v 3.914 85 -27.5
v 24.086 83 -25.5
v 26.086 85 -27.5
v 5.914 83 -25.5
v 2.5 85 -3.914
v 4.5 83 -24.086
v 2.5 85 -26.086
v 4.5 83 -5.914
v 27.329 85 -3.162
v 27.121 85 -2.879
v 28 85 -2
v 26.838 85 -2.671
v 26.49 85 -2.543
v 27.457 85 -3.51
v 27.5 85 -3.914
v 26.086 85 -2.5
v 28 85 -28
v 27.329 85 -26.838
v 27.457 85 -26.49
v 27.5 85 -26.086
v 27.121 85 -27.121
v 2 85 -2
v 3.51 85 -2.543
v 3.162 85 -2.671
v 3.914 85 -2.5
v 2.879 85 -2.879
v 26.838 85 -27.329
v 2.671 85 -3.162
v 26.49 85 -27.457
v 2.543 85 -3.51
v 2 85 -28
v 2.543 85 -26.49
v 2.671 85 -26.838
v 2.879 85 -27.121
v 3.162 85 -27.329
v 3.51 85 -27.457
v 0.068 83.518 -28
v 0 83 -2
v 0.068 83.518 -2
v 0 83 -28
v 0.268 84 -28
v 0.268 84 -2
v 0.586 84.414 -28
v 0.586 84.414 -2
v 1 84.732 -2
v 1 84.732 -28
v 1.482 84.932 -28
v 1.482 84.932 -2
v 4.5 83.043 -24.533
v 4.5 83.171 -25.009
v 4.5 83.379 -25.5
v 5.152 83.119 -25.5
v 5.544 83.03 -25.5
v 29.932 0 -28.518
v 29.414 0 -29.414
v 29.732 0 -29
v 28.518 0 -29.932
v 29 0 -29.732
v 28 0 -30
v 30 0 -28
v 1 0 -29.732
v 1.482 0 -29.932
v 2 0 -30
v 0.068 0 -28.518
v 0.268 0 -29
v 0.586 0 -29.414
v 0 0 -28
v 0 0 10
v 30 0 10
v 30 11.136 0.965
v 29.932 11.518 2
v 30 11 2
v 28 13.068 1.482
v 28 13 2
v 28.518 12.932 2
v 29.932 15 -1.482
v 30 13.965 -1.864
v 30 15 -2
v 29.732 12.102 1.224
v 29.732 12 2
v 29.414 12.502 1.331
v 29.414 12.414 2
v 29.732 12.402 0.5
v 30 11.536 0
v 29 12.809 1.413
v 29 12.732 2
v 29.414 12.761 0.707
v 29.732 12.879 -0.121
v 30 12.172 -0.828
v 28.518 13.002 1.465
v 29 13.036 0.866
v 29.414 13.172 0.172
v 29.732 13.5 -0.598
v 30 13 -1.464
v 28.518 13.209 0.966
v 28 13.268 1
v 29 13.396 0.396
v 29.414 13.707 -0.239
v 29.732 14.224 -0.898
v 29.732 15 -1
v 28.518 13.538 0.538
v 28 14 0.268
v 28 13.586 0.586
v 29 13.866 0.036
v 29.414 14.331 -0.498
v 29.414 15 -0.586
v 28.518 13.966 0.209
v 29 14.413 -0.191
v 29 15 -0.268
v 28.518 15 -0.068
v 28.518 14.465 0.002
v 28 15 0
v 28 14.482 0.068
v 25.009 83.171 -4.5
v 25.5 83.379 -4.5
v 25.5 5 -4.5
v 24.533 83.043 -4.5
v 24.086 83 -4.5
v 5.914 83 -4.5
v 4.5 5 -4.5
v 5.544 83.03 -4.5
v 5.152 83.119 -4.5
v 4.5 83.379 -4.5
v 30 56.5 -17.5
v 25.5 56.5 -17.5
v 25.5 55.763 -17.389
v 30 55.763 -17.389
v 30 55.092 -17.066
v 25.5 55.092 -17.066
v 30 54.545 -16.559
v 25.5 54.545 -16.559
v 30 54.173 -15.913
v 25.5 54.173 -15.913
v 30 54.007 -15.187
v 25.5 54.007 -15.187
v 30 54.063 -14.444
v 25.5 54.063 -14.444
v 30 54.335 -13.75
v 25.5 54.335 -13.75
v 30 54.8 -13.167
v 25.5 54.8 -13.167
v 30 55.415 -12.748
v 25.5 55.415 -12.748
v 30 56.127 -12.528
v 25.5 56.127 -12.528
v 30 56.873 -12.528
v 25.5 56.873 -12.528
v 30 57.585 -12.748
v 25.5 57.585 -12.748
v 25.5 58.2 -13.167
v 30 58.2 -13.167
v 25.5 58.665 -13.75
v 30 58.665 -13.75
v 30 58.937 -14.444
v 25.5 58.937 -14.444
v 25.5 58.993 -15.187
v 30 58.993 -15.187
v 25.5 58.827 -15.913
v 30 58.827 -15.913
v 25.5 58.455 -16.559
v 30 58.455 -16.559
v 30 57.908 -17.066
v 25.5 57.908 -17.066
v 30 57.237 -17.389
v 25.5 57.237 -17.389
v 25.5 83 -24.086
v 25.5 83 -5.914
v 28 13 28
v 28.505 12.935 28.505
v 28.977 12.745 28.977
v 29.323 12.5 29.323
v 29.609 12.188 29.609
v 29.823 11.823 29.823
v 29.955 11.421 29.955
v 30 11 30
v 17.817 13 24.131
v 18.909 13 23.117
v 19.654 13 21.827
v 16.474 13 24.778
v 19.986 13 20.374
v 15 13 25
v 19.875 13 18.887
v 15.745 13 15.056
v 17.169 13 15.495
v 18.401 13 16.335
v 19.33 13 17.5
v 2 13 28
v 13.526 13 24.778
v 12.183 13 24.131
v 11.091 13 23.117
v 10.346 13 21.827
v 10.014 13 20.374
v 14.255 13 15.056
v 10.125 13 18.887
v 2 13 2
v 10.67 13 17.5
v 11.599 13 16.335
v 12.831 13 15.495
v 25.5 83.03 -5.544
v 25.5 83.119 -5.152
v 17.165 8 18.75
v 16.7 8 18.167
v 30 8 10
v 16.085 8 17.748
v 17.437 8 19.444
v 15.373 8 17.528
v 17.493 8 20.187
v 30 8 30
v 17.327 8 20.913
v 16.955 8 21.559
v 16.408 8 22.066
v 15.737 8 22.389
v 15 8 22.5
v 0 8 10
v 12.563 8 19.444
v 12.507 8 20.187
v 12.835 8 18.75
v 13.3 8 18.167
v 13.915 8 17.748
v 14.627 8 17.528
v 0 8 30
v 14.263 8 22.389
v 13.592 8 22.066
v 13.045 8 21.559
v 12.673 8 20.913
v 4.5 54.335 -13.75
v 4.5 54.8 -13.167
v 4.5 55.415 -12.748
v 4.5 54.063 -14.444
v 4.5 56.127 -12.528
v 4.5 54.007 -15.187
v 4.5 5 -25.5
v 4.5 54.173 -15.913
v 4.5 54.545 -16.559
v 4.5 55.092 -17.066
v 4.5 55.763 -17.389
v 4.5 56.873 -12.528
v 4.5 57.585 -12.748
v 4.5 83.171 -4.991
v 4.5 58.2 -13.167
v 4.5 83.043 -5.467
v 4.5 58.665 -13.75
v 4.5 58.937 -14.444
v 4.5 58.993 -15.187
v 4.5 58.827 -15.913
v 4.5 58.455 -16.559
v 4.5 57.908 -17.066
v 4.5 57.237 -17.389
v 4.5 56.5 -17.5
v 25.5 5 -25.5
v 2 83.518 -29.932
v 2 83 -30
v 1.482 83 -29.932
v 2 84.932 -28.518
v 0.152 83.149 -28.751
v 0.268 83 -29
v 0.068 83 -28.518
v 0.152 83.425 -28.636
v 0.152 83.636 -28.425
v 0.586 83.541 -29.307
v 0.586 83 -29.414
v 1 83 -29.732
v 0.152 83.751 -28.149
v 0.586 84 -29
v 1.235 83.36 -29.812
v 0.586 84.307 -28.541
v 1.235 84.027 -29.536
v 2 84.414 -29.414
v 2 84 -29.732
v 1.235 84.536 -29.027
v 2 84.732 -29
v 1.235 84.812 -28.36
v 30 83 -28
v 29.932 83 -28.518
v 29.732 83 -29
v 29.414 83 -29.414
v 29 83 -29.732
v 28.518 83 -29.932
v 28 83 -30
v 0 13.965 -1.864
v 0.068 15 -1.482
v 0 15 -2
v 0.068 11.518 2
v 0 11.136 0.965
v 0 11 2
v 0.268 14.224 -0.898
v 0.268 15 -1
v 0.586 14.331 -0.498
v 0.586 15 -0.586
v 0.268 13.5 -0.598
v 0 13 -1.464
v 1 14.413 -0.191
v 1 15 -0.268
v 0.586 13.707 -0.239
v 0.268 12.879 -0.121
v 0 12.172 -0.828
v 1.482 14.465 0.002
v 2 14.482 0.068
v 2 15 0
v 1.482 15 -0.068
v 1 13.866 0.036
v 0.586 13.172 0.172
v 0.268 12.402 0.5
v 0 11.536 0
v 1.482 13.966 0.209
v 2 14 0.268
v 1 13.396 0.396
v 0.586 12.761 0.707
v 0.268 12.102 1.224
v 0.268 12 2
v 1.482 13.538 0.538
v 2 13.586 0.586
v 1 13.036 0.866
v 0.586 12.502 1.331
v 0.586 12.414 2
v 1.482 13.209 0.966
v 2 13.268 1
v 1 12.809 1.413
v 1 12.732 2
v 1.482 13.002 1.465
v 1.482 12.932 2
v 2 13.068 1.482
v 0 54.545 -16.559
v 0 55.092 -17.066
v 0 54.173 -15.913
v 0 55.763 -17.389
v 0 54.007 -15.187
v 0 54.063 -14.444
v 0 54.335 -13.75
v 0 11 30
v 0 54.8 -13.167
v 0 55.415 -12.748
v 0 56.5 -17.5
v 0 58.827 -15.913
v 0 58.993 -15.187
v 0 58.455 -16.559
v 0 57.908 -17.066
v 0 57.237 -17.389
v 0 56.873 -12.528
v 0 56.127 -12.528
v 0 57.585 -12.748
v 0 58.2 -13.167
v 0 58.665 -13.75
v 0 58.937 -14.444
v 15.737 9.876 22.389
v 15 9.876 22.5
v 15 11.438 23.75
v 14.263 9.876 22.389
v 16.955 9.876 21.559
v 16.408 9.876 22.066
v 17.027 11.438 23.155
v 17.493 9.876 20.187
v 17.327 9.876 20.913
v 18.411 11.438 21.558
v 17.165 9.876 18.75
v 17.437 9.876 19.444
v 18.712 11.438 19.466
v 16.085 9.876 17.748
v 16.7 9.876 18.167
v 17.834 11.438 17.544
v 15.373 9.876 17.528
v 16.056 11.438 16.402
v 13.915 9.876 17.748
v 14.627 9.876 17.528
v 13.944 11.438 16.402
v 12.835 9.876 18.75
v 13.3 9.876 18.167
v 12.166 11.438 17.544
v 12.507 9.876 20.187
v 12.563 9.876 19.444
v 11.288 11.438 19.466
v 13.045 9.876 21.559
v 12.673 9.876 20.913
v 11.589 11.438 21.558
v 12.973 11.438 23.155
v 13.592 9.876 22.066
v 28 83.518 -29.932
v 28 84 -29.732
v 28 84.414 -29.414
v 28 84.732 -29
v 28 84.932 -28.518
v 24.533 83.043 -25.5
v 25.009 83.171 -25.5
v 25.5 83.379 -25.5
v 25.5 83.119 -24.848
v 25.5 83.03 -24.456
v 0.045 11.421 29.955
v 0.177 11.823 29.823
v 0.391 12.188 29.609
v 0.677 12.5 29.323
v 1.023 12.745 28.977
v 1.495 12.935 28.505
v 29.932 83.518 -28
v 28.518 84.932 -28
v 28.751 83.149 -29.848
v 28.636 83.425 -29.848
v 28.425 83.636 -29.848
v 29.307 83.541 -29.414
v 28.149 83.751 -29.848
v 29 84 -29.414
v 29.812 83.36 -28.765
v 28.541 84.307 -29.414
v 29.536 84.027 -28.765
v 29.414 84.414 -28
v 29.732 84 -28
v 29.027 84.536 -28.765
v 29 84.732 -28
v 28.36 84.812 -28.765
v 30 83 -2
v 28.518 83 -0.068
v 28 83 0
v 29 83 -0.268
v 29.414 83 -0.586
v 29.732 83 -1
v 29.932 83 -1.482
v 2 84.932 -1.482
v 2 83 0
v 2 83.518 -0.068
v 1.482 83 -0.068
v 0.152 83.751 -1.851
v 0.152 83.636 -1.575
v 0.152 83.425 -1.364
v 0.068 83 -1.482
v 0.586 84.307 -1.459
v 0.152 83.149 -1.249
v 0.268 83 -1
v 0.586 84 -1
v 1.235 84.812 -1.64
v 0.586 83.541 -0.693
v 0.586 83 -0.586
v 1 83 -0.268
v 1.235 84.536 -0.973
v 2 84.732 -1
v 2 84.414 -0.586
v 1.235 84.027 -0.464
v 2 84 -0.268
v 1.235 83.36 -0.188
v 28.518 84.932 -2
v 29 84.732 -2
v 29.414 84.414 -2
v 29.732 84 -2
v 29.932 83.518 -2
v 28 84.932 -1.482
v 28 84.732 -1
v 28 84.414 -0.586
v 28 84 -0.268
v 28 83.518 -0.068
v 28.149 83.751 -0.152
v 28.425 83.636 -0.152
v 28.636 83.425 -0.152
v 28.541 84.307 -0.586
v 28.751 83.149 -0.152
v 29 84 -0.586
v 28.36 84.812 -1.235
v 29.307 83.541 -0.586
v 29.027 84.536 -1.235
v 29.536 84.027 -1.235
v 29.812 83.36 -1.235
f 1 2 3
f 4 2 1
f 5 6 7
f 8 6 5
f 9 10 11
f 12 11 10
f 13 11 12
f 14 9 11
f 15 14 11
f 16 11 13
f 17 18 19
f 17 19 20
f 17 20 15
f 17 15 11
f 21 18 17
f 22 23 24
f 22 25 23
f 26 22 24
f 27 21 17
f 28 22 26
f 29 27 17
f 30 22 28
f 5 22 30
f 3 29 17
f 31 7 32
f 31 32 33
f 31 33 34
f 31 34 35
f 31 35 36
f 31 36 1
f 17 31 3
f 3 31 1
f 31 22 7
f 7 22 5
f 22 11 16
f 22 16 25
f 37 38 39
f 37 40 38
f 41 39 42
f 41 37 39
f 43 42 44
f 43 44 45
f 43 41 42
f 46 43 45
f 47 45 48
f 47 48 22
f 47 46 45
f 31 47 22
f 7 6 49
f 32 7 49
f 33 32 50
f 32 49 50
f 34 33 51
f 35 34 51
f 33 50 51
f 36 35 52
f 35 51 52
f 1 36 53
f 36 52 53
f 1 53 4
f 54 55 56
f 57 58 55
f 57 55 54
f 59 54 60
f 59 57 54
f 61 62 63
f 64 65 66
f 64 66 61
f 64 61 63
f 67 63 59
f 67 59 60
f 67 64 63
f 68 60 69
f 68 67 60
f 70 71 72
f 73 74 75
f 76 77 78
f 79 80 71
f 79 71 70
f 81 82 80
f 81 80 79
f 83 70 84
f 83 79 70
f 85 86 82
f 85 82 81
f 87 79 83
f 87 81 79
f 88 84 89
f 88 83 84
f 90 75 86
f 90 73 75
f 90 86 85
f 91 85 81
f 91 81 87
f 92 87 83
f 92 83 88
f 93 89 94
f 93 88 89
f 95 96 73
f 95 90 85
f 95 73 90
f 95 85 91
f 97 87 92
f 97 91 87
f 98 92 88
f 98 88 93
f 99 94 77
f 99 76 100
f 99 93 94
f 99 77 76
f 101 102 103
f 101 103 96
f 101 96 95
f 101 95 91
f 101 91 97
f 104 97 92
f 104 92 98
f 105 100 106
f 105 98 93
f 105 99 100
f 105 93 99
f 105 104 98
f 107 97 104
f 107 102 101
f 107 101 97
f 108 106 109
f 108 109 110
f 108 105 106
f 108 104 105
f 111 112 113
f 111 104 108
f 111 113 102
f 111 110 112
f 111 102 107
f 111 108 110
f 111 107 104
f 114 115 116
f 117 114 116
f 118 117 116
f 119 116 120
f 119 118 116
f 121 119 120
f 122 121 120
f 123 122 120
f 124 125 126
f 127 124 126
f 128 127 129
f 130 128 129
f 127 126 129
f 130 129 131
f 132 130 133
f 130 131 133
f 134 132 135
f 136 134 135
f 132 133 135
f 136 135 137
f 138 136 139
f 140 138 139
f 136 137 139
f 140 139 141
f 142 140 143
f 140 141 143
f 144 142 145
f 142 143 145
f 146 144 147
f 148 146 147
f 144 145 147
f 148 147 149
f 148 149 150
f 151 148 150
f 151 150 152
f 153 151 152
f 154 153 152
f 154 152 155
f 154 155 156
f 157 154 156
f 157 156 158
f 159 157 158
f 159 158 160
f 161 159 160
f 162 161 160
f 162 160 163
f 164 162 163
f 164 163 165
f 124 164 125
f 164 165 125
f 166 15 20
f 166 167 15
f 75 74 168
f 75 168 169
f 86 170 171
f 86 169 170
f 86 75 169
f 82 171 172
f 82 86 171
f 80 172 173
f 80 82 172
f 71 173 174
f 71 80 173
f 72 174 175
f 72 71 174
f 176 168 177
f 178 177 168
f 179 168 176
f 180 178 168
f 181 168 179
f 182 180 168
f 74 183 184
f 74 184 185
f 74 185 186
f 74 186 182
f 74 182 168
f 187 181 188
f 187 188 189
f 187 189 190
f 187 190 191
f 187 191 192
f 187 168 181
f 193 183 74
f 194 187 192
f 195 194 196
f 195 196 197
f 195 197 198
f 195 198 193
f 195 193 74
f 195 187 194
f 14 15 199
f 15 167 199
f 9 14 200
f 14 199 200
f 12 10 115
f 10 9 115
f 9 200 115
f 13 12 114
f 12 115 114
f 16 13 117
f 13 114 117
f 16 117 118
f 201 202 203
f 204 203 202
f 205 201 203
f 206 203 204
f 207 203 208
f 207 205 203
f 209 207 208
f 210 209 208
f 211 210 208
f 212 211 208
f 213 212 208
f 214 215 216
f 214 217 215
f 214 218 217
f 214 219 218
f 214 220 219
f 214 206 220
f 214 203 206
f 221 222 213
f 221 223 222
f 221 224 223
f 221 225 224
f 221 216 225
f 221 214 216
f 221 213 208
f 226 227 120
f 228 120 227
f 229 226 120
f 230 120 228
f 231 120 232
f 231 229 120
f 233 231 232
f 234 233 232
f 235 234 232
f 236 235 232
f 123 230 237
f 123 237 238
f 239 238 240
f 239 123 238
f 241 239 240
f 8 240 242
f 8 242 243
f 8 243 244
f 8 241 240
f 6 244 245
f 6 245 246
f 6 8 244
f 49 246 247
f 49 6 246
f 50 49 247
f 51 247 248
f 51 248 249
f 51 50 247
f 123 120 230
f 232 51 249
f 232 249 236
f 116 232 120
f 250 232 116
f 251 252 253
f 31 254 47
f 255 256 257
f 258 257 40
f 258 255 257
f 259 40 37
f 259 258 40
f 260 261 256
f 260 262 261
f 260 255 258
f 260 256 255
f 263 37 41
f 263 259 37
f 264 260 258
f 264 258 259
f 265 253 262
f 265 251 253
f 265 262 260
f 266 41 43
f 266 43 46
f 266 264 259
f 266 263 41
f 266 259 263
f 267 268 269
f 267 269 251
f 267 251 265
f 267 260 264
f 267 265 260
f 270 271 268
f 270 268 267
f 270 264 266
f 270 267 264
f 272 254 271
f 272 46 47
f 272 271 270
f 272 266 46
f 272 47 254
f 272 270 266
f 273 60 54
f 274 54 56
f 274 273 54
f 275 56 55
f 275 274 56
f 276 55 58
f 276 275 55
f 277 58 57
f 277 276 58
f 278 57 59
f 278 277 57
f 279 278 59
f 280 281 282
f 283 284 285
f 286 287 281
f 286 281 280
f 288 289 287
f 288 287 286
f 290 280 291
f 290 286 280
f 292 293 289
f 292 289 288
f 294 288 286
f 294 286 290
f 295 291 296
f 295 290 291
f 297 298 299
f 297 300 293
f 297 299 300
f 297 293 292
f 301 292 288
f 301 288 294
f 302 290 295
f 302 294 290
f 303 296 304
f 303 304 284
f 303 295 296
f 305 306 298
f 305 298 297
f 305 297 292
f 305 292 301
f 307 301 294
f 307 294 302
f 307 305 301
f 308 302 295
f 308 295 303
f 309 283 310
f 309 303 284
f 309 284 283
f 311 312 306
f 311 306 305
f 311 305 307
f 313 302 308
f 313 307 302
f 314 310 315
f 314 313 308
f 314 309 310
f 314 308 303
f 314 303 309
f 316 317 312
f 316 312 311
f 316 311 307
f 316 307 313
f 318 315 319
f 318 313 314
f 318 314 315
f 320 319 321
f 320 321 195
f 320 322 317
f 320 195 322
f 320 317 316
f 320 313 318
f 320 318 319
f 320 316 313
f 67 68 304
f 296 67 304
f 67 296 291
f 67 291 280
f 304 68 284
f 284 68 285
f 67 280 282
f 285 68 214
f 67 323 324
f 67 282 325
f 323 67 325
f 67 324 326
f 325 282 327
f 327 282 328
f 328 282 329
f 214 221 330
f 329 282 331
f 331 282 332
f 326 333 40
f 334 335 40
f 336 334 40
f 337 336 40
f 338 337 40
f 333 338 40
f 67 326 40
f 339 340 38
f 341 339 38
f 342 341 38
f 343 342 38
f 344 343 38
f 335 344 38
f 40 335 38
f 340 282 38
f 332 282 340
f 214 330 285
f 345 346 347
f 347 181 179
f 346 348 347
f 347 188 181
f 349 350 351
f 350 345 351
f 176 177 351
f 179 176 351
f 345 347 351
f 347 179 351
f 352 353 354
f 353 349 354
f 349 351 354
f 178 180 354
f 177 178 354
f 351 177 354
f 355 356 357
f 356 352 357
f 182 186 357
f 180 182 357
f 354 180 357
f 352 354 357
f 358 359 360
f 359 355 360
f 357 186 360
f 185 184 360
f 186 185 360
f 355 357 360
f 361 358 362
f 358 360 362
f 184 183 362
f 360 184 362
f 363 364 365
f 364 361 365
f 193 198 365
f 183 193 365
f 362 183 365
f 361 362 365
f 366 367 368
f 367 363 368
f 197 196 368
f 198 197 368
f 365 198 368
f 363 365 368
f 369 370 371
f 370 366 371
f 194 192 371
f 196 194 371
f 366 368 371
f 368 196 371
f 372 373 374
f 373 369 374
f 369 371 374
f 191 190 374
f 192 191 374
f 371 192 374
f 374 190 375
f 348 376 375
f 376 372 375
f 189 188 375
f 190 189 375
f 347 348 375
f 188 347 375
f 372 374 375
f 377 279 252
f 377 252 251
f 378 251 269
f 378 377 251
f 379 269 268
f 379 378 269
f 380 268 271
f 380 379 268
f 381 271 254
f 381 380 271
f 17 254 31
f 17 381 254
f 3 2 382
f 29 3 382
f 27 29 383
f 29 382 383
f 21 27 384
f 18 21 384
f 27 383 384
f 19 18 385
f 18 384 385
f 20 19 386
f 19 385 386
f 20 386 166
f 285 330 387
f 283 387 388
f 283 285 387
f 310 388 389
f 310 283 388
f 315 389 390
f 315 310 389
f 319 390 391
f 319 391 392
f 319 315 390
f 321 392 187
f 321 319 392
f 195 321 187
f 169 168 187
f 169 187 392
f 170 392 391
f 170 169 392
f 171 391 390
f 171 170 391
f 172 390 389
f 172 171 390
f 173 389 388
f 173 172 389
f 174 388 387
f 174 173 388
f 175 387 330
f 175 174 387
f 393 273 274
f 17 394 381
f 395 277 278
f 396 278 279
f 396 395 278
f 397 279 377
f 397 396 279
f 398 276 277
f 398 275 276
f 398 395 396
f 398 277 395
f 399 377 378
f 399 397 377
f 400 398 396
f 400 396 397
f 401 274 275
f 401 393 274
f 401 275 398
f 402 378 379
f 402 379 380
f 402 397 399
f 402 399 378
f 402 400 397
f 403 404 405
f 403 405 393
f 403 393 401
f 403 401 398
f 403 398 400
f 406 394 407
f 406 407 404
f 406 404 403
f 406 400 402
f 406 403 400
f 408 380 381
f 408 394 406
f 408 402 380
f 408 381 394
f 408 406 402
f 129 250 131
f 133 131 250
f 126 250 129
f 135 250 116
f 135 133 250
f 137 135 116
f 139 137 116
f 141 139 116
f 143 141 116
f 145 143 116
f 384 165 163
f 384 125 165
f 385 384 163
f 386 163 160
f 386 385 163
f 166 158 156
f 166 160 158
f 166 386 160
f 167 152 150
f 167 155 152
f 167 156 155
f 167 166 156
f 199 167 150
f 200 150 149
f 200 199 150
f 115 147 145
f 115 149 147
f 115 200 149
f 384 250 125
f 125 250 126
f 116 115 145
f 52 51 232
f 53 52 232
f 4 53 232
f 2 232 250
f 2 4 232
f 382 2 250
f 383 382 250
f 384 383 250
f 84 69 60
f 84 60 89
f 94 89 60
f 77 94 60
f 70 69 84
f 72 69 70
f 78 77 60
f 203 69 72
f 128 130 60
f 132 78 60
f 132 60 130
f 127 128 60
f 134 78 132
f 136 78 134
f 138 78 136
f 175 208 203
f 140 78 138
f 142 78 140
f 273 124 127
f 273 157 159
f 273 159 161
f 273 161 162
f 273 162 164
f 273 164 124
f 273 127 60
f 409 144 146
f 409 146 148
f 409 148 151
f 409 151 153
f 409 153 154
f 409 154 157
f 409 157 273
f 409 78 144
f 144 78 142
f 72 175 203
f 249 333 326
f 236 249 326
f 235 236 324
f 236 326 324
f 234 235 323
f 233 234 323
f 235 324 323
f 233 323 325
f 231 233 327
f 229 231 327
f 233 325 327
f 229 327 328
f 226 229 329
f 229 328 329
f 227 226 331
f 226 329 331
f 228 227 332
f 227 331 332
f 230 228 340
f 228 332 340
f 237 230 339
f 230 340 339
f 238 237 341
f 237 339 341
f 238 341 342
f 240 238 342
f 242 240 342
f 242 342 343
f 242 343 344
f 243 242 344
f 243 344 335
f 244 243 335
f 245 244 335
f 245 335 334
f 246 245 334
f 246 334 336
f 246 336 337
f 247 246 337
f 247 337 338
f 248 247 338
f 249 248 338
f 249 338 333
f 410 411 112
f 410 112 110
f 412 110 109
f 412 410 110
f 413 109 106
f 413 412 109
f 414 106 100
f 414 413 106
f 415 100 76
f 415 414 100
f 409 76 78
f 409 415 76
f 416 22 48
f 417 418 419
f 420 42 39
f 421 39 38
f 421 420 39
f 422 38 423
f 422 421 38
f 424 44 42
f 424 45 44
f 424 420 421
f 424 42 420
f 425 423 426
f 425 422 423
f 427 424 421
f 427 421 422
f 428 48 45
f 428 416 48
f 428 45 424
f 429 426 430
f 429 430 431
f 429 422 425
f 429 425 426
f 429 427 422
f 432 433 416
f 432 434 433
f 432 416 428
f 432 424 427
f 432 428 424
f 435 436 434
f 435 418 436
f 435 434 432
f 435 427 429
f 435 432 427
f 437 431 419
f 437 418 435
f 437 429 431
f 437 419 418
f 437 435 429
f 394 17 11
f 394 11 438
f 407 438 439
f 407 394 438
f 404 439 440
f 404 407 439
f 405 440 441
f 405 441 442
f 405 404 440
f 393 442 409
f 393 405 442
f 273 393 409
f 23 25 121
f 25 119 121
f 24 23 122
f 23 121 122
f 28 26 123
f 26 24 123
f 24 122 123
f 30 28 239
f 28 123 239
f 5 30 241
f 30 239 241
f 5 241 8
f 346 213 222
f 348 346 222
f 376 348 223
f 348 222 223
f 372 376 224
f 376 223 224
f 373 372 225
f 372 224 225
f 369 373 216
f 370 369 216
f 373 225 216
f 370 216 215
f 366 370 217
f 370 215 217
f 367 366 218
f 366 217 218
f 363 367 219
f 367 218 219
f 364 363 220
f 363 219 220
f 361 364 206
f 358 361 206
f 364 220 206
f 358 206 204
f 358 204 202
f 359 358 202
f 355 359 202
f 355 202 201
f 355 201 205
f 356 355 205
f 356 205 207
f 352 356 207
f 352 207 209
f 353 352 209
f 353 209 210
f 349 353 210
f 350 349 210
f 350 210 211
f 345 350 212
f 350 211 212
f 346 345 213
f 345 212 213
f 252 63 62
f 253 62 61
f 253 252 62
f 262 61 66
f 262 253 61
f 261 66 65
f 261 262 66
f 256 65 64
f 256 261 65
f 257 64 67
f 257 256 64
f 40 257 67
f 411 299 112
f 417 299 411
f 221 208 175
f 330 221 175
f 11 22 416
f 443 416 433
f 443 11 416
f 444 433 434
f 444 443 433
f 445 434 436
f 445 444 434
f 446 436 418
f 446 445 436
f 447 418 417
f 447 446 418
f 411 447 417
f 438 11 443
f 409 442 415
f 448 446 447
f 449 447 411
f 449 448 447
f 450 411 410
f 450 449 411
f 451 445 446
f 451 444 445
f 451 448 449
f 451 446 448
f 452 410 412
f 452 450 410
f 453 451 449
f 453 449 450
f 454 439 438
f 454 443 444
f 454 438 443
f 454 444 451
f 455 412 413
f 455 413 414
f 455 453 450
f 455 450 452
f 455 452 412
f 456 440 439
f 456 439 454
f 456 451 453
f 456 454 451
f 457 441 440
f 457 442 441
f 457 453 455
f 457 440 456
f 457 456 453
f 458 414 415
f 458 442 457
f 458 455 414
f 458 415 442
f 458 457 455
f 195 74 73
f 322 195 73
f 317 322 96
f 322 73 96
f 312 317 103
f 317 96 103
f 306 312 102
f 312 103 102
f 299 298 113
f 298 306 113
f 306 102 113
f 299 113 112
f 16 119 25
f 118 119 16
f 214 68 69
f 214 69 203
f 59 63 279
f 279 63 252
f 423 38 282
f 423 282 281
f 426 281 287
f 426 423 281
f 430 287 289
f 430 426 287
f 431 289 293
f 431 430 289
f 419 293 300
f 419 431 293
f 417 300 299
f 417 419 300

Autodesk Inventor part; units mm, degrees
ref_plane "YZ Plane" through (0, 0, 0) normal (1, 0, 0) x (0, 1, 0)
ref_plane "XZ Plane" through (0, 0, 0) normal (0, 1, 0) x (-1, 0, 0)
ref_plane "XY Plane" through (0, 0, 0) normal (0, 0, 1) x (1, 0, 0)
sketch "Sketch1" plane through (0, 0, 0) normal (1, 0, 0) x (0, 1, 0)
  line L0 (0, 0) -> (0, -30)
  line L1 (13, 0) -> (30, 0) construction
  line L2 (0, -30) -> (85, -30)
  line L3 (13, 0) -> (85, 0)
  line L4 (85, 0) -> (85, -30)
  line L5 (0, 0) -> (0, 10)
  line L6 (13, 0) -> (14, 0) construction
  line L7 (0, 10) -> (8, 10)
  line L8 (8, 10) -> (8, 30)
  line L9 (8, 30) -> (13, 30)
  line L10 (13, 30) -> (13, 0)
  point P0 (59, -15)
  dimension "d0" = 30
  dimension "d2" = 85
  dimension "d4" = 10
  dimension "d6" = 8
  dimension "d7" = 20
  dimension "d8" = 5
  dimension "d47" = 30
extrude "Extrusion1" add sketch "Sketch1" along normal blind 30
sketch "Sketch2" plane through (0, 85, 0) normal (0, 1, 0) x (1, 0, 0)
  line L0 (4.5, 4.5) -> (4.5, 25.5)
  line L1 (4.5, 4.5) -> (25.5, 4.5) construction
  line L2 (4.5, 25.5) -> (25.5, 25.5)
  line L3 (25.5, 25.5) -> (25.5, 4.5)
  line L4 (25.5, 4.5) -> (4.5, 4.5)
  line L5 (30, 30) -> (30, 0) projected
  point P0 (0, 0)
  dimension "d13" = 21
  dimension "d14" = 90
  dimension "d15" = 21
  dimension "d16" = 90
  dimension "d17" = 21
  dimension "d18" = 90
  dimension "d19" = 21
  dimension "d46" = 4.5
  dimension "d48" = 90
  dimension "d49" = 4.5
extrude "Extrusion2" cut sketch "Sketch2" against normal blind 80
fillet "Fillet1" radius 2 12 edges at (30, 85, -15) (15, 85, 0) (15, 85, -30) (0, 85, -15) (30, 49, 0) (30, 42.5, -30) (0, 49, 0) (0, 42.5, -30) (0, 13, 15) (15, 13, 30) (30, 13, 15) (15, 13, 0)
sketch "Sketch4" plane through (2, 13, 2) normal (0, 1, 0) x (1, 0, 0)
  line L0 (-2, -28) -> (28, -28) projected
  point P0 (-2, 2)
  point P1 (13, -18)
  point P2 (13, -28)
  dimension "d37" = 10
hole "Hole1" at (15, 13, 20) direction (0, -1, 0) diameter 5 end through all countersink diameter 10 countersink angle 77.33
sketch "Sketch6" plane through (30, 0, 0) normal (1, 0, 0) x (0, 0, -1)
  line L0 (-10, 0) -> (28, 0) projected
  point P0 (0, 0)
  point P1 (15, 56.5)
  dimension "d45" = 56.5
hole "Hole2" at (30, 56.5, -15) direction (-1, 0, 0) diameter 5 end through all
chamfer "Chamfer2" distance 2 angle 45 4 edges at (4.5, 85, -15) (15, 85, -25.5) (25.5, 85, -15) (15, 85, -4.5)
fillet "Fillet3" radius 2 4 edges at (3.5, 84, -26.5) (26.5, 84, -26.5) (26.5, 84, -3.5) (3.5, 84, -3.5)
properties part number "flexibler_standfuß_v0.8"
